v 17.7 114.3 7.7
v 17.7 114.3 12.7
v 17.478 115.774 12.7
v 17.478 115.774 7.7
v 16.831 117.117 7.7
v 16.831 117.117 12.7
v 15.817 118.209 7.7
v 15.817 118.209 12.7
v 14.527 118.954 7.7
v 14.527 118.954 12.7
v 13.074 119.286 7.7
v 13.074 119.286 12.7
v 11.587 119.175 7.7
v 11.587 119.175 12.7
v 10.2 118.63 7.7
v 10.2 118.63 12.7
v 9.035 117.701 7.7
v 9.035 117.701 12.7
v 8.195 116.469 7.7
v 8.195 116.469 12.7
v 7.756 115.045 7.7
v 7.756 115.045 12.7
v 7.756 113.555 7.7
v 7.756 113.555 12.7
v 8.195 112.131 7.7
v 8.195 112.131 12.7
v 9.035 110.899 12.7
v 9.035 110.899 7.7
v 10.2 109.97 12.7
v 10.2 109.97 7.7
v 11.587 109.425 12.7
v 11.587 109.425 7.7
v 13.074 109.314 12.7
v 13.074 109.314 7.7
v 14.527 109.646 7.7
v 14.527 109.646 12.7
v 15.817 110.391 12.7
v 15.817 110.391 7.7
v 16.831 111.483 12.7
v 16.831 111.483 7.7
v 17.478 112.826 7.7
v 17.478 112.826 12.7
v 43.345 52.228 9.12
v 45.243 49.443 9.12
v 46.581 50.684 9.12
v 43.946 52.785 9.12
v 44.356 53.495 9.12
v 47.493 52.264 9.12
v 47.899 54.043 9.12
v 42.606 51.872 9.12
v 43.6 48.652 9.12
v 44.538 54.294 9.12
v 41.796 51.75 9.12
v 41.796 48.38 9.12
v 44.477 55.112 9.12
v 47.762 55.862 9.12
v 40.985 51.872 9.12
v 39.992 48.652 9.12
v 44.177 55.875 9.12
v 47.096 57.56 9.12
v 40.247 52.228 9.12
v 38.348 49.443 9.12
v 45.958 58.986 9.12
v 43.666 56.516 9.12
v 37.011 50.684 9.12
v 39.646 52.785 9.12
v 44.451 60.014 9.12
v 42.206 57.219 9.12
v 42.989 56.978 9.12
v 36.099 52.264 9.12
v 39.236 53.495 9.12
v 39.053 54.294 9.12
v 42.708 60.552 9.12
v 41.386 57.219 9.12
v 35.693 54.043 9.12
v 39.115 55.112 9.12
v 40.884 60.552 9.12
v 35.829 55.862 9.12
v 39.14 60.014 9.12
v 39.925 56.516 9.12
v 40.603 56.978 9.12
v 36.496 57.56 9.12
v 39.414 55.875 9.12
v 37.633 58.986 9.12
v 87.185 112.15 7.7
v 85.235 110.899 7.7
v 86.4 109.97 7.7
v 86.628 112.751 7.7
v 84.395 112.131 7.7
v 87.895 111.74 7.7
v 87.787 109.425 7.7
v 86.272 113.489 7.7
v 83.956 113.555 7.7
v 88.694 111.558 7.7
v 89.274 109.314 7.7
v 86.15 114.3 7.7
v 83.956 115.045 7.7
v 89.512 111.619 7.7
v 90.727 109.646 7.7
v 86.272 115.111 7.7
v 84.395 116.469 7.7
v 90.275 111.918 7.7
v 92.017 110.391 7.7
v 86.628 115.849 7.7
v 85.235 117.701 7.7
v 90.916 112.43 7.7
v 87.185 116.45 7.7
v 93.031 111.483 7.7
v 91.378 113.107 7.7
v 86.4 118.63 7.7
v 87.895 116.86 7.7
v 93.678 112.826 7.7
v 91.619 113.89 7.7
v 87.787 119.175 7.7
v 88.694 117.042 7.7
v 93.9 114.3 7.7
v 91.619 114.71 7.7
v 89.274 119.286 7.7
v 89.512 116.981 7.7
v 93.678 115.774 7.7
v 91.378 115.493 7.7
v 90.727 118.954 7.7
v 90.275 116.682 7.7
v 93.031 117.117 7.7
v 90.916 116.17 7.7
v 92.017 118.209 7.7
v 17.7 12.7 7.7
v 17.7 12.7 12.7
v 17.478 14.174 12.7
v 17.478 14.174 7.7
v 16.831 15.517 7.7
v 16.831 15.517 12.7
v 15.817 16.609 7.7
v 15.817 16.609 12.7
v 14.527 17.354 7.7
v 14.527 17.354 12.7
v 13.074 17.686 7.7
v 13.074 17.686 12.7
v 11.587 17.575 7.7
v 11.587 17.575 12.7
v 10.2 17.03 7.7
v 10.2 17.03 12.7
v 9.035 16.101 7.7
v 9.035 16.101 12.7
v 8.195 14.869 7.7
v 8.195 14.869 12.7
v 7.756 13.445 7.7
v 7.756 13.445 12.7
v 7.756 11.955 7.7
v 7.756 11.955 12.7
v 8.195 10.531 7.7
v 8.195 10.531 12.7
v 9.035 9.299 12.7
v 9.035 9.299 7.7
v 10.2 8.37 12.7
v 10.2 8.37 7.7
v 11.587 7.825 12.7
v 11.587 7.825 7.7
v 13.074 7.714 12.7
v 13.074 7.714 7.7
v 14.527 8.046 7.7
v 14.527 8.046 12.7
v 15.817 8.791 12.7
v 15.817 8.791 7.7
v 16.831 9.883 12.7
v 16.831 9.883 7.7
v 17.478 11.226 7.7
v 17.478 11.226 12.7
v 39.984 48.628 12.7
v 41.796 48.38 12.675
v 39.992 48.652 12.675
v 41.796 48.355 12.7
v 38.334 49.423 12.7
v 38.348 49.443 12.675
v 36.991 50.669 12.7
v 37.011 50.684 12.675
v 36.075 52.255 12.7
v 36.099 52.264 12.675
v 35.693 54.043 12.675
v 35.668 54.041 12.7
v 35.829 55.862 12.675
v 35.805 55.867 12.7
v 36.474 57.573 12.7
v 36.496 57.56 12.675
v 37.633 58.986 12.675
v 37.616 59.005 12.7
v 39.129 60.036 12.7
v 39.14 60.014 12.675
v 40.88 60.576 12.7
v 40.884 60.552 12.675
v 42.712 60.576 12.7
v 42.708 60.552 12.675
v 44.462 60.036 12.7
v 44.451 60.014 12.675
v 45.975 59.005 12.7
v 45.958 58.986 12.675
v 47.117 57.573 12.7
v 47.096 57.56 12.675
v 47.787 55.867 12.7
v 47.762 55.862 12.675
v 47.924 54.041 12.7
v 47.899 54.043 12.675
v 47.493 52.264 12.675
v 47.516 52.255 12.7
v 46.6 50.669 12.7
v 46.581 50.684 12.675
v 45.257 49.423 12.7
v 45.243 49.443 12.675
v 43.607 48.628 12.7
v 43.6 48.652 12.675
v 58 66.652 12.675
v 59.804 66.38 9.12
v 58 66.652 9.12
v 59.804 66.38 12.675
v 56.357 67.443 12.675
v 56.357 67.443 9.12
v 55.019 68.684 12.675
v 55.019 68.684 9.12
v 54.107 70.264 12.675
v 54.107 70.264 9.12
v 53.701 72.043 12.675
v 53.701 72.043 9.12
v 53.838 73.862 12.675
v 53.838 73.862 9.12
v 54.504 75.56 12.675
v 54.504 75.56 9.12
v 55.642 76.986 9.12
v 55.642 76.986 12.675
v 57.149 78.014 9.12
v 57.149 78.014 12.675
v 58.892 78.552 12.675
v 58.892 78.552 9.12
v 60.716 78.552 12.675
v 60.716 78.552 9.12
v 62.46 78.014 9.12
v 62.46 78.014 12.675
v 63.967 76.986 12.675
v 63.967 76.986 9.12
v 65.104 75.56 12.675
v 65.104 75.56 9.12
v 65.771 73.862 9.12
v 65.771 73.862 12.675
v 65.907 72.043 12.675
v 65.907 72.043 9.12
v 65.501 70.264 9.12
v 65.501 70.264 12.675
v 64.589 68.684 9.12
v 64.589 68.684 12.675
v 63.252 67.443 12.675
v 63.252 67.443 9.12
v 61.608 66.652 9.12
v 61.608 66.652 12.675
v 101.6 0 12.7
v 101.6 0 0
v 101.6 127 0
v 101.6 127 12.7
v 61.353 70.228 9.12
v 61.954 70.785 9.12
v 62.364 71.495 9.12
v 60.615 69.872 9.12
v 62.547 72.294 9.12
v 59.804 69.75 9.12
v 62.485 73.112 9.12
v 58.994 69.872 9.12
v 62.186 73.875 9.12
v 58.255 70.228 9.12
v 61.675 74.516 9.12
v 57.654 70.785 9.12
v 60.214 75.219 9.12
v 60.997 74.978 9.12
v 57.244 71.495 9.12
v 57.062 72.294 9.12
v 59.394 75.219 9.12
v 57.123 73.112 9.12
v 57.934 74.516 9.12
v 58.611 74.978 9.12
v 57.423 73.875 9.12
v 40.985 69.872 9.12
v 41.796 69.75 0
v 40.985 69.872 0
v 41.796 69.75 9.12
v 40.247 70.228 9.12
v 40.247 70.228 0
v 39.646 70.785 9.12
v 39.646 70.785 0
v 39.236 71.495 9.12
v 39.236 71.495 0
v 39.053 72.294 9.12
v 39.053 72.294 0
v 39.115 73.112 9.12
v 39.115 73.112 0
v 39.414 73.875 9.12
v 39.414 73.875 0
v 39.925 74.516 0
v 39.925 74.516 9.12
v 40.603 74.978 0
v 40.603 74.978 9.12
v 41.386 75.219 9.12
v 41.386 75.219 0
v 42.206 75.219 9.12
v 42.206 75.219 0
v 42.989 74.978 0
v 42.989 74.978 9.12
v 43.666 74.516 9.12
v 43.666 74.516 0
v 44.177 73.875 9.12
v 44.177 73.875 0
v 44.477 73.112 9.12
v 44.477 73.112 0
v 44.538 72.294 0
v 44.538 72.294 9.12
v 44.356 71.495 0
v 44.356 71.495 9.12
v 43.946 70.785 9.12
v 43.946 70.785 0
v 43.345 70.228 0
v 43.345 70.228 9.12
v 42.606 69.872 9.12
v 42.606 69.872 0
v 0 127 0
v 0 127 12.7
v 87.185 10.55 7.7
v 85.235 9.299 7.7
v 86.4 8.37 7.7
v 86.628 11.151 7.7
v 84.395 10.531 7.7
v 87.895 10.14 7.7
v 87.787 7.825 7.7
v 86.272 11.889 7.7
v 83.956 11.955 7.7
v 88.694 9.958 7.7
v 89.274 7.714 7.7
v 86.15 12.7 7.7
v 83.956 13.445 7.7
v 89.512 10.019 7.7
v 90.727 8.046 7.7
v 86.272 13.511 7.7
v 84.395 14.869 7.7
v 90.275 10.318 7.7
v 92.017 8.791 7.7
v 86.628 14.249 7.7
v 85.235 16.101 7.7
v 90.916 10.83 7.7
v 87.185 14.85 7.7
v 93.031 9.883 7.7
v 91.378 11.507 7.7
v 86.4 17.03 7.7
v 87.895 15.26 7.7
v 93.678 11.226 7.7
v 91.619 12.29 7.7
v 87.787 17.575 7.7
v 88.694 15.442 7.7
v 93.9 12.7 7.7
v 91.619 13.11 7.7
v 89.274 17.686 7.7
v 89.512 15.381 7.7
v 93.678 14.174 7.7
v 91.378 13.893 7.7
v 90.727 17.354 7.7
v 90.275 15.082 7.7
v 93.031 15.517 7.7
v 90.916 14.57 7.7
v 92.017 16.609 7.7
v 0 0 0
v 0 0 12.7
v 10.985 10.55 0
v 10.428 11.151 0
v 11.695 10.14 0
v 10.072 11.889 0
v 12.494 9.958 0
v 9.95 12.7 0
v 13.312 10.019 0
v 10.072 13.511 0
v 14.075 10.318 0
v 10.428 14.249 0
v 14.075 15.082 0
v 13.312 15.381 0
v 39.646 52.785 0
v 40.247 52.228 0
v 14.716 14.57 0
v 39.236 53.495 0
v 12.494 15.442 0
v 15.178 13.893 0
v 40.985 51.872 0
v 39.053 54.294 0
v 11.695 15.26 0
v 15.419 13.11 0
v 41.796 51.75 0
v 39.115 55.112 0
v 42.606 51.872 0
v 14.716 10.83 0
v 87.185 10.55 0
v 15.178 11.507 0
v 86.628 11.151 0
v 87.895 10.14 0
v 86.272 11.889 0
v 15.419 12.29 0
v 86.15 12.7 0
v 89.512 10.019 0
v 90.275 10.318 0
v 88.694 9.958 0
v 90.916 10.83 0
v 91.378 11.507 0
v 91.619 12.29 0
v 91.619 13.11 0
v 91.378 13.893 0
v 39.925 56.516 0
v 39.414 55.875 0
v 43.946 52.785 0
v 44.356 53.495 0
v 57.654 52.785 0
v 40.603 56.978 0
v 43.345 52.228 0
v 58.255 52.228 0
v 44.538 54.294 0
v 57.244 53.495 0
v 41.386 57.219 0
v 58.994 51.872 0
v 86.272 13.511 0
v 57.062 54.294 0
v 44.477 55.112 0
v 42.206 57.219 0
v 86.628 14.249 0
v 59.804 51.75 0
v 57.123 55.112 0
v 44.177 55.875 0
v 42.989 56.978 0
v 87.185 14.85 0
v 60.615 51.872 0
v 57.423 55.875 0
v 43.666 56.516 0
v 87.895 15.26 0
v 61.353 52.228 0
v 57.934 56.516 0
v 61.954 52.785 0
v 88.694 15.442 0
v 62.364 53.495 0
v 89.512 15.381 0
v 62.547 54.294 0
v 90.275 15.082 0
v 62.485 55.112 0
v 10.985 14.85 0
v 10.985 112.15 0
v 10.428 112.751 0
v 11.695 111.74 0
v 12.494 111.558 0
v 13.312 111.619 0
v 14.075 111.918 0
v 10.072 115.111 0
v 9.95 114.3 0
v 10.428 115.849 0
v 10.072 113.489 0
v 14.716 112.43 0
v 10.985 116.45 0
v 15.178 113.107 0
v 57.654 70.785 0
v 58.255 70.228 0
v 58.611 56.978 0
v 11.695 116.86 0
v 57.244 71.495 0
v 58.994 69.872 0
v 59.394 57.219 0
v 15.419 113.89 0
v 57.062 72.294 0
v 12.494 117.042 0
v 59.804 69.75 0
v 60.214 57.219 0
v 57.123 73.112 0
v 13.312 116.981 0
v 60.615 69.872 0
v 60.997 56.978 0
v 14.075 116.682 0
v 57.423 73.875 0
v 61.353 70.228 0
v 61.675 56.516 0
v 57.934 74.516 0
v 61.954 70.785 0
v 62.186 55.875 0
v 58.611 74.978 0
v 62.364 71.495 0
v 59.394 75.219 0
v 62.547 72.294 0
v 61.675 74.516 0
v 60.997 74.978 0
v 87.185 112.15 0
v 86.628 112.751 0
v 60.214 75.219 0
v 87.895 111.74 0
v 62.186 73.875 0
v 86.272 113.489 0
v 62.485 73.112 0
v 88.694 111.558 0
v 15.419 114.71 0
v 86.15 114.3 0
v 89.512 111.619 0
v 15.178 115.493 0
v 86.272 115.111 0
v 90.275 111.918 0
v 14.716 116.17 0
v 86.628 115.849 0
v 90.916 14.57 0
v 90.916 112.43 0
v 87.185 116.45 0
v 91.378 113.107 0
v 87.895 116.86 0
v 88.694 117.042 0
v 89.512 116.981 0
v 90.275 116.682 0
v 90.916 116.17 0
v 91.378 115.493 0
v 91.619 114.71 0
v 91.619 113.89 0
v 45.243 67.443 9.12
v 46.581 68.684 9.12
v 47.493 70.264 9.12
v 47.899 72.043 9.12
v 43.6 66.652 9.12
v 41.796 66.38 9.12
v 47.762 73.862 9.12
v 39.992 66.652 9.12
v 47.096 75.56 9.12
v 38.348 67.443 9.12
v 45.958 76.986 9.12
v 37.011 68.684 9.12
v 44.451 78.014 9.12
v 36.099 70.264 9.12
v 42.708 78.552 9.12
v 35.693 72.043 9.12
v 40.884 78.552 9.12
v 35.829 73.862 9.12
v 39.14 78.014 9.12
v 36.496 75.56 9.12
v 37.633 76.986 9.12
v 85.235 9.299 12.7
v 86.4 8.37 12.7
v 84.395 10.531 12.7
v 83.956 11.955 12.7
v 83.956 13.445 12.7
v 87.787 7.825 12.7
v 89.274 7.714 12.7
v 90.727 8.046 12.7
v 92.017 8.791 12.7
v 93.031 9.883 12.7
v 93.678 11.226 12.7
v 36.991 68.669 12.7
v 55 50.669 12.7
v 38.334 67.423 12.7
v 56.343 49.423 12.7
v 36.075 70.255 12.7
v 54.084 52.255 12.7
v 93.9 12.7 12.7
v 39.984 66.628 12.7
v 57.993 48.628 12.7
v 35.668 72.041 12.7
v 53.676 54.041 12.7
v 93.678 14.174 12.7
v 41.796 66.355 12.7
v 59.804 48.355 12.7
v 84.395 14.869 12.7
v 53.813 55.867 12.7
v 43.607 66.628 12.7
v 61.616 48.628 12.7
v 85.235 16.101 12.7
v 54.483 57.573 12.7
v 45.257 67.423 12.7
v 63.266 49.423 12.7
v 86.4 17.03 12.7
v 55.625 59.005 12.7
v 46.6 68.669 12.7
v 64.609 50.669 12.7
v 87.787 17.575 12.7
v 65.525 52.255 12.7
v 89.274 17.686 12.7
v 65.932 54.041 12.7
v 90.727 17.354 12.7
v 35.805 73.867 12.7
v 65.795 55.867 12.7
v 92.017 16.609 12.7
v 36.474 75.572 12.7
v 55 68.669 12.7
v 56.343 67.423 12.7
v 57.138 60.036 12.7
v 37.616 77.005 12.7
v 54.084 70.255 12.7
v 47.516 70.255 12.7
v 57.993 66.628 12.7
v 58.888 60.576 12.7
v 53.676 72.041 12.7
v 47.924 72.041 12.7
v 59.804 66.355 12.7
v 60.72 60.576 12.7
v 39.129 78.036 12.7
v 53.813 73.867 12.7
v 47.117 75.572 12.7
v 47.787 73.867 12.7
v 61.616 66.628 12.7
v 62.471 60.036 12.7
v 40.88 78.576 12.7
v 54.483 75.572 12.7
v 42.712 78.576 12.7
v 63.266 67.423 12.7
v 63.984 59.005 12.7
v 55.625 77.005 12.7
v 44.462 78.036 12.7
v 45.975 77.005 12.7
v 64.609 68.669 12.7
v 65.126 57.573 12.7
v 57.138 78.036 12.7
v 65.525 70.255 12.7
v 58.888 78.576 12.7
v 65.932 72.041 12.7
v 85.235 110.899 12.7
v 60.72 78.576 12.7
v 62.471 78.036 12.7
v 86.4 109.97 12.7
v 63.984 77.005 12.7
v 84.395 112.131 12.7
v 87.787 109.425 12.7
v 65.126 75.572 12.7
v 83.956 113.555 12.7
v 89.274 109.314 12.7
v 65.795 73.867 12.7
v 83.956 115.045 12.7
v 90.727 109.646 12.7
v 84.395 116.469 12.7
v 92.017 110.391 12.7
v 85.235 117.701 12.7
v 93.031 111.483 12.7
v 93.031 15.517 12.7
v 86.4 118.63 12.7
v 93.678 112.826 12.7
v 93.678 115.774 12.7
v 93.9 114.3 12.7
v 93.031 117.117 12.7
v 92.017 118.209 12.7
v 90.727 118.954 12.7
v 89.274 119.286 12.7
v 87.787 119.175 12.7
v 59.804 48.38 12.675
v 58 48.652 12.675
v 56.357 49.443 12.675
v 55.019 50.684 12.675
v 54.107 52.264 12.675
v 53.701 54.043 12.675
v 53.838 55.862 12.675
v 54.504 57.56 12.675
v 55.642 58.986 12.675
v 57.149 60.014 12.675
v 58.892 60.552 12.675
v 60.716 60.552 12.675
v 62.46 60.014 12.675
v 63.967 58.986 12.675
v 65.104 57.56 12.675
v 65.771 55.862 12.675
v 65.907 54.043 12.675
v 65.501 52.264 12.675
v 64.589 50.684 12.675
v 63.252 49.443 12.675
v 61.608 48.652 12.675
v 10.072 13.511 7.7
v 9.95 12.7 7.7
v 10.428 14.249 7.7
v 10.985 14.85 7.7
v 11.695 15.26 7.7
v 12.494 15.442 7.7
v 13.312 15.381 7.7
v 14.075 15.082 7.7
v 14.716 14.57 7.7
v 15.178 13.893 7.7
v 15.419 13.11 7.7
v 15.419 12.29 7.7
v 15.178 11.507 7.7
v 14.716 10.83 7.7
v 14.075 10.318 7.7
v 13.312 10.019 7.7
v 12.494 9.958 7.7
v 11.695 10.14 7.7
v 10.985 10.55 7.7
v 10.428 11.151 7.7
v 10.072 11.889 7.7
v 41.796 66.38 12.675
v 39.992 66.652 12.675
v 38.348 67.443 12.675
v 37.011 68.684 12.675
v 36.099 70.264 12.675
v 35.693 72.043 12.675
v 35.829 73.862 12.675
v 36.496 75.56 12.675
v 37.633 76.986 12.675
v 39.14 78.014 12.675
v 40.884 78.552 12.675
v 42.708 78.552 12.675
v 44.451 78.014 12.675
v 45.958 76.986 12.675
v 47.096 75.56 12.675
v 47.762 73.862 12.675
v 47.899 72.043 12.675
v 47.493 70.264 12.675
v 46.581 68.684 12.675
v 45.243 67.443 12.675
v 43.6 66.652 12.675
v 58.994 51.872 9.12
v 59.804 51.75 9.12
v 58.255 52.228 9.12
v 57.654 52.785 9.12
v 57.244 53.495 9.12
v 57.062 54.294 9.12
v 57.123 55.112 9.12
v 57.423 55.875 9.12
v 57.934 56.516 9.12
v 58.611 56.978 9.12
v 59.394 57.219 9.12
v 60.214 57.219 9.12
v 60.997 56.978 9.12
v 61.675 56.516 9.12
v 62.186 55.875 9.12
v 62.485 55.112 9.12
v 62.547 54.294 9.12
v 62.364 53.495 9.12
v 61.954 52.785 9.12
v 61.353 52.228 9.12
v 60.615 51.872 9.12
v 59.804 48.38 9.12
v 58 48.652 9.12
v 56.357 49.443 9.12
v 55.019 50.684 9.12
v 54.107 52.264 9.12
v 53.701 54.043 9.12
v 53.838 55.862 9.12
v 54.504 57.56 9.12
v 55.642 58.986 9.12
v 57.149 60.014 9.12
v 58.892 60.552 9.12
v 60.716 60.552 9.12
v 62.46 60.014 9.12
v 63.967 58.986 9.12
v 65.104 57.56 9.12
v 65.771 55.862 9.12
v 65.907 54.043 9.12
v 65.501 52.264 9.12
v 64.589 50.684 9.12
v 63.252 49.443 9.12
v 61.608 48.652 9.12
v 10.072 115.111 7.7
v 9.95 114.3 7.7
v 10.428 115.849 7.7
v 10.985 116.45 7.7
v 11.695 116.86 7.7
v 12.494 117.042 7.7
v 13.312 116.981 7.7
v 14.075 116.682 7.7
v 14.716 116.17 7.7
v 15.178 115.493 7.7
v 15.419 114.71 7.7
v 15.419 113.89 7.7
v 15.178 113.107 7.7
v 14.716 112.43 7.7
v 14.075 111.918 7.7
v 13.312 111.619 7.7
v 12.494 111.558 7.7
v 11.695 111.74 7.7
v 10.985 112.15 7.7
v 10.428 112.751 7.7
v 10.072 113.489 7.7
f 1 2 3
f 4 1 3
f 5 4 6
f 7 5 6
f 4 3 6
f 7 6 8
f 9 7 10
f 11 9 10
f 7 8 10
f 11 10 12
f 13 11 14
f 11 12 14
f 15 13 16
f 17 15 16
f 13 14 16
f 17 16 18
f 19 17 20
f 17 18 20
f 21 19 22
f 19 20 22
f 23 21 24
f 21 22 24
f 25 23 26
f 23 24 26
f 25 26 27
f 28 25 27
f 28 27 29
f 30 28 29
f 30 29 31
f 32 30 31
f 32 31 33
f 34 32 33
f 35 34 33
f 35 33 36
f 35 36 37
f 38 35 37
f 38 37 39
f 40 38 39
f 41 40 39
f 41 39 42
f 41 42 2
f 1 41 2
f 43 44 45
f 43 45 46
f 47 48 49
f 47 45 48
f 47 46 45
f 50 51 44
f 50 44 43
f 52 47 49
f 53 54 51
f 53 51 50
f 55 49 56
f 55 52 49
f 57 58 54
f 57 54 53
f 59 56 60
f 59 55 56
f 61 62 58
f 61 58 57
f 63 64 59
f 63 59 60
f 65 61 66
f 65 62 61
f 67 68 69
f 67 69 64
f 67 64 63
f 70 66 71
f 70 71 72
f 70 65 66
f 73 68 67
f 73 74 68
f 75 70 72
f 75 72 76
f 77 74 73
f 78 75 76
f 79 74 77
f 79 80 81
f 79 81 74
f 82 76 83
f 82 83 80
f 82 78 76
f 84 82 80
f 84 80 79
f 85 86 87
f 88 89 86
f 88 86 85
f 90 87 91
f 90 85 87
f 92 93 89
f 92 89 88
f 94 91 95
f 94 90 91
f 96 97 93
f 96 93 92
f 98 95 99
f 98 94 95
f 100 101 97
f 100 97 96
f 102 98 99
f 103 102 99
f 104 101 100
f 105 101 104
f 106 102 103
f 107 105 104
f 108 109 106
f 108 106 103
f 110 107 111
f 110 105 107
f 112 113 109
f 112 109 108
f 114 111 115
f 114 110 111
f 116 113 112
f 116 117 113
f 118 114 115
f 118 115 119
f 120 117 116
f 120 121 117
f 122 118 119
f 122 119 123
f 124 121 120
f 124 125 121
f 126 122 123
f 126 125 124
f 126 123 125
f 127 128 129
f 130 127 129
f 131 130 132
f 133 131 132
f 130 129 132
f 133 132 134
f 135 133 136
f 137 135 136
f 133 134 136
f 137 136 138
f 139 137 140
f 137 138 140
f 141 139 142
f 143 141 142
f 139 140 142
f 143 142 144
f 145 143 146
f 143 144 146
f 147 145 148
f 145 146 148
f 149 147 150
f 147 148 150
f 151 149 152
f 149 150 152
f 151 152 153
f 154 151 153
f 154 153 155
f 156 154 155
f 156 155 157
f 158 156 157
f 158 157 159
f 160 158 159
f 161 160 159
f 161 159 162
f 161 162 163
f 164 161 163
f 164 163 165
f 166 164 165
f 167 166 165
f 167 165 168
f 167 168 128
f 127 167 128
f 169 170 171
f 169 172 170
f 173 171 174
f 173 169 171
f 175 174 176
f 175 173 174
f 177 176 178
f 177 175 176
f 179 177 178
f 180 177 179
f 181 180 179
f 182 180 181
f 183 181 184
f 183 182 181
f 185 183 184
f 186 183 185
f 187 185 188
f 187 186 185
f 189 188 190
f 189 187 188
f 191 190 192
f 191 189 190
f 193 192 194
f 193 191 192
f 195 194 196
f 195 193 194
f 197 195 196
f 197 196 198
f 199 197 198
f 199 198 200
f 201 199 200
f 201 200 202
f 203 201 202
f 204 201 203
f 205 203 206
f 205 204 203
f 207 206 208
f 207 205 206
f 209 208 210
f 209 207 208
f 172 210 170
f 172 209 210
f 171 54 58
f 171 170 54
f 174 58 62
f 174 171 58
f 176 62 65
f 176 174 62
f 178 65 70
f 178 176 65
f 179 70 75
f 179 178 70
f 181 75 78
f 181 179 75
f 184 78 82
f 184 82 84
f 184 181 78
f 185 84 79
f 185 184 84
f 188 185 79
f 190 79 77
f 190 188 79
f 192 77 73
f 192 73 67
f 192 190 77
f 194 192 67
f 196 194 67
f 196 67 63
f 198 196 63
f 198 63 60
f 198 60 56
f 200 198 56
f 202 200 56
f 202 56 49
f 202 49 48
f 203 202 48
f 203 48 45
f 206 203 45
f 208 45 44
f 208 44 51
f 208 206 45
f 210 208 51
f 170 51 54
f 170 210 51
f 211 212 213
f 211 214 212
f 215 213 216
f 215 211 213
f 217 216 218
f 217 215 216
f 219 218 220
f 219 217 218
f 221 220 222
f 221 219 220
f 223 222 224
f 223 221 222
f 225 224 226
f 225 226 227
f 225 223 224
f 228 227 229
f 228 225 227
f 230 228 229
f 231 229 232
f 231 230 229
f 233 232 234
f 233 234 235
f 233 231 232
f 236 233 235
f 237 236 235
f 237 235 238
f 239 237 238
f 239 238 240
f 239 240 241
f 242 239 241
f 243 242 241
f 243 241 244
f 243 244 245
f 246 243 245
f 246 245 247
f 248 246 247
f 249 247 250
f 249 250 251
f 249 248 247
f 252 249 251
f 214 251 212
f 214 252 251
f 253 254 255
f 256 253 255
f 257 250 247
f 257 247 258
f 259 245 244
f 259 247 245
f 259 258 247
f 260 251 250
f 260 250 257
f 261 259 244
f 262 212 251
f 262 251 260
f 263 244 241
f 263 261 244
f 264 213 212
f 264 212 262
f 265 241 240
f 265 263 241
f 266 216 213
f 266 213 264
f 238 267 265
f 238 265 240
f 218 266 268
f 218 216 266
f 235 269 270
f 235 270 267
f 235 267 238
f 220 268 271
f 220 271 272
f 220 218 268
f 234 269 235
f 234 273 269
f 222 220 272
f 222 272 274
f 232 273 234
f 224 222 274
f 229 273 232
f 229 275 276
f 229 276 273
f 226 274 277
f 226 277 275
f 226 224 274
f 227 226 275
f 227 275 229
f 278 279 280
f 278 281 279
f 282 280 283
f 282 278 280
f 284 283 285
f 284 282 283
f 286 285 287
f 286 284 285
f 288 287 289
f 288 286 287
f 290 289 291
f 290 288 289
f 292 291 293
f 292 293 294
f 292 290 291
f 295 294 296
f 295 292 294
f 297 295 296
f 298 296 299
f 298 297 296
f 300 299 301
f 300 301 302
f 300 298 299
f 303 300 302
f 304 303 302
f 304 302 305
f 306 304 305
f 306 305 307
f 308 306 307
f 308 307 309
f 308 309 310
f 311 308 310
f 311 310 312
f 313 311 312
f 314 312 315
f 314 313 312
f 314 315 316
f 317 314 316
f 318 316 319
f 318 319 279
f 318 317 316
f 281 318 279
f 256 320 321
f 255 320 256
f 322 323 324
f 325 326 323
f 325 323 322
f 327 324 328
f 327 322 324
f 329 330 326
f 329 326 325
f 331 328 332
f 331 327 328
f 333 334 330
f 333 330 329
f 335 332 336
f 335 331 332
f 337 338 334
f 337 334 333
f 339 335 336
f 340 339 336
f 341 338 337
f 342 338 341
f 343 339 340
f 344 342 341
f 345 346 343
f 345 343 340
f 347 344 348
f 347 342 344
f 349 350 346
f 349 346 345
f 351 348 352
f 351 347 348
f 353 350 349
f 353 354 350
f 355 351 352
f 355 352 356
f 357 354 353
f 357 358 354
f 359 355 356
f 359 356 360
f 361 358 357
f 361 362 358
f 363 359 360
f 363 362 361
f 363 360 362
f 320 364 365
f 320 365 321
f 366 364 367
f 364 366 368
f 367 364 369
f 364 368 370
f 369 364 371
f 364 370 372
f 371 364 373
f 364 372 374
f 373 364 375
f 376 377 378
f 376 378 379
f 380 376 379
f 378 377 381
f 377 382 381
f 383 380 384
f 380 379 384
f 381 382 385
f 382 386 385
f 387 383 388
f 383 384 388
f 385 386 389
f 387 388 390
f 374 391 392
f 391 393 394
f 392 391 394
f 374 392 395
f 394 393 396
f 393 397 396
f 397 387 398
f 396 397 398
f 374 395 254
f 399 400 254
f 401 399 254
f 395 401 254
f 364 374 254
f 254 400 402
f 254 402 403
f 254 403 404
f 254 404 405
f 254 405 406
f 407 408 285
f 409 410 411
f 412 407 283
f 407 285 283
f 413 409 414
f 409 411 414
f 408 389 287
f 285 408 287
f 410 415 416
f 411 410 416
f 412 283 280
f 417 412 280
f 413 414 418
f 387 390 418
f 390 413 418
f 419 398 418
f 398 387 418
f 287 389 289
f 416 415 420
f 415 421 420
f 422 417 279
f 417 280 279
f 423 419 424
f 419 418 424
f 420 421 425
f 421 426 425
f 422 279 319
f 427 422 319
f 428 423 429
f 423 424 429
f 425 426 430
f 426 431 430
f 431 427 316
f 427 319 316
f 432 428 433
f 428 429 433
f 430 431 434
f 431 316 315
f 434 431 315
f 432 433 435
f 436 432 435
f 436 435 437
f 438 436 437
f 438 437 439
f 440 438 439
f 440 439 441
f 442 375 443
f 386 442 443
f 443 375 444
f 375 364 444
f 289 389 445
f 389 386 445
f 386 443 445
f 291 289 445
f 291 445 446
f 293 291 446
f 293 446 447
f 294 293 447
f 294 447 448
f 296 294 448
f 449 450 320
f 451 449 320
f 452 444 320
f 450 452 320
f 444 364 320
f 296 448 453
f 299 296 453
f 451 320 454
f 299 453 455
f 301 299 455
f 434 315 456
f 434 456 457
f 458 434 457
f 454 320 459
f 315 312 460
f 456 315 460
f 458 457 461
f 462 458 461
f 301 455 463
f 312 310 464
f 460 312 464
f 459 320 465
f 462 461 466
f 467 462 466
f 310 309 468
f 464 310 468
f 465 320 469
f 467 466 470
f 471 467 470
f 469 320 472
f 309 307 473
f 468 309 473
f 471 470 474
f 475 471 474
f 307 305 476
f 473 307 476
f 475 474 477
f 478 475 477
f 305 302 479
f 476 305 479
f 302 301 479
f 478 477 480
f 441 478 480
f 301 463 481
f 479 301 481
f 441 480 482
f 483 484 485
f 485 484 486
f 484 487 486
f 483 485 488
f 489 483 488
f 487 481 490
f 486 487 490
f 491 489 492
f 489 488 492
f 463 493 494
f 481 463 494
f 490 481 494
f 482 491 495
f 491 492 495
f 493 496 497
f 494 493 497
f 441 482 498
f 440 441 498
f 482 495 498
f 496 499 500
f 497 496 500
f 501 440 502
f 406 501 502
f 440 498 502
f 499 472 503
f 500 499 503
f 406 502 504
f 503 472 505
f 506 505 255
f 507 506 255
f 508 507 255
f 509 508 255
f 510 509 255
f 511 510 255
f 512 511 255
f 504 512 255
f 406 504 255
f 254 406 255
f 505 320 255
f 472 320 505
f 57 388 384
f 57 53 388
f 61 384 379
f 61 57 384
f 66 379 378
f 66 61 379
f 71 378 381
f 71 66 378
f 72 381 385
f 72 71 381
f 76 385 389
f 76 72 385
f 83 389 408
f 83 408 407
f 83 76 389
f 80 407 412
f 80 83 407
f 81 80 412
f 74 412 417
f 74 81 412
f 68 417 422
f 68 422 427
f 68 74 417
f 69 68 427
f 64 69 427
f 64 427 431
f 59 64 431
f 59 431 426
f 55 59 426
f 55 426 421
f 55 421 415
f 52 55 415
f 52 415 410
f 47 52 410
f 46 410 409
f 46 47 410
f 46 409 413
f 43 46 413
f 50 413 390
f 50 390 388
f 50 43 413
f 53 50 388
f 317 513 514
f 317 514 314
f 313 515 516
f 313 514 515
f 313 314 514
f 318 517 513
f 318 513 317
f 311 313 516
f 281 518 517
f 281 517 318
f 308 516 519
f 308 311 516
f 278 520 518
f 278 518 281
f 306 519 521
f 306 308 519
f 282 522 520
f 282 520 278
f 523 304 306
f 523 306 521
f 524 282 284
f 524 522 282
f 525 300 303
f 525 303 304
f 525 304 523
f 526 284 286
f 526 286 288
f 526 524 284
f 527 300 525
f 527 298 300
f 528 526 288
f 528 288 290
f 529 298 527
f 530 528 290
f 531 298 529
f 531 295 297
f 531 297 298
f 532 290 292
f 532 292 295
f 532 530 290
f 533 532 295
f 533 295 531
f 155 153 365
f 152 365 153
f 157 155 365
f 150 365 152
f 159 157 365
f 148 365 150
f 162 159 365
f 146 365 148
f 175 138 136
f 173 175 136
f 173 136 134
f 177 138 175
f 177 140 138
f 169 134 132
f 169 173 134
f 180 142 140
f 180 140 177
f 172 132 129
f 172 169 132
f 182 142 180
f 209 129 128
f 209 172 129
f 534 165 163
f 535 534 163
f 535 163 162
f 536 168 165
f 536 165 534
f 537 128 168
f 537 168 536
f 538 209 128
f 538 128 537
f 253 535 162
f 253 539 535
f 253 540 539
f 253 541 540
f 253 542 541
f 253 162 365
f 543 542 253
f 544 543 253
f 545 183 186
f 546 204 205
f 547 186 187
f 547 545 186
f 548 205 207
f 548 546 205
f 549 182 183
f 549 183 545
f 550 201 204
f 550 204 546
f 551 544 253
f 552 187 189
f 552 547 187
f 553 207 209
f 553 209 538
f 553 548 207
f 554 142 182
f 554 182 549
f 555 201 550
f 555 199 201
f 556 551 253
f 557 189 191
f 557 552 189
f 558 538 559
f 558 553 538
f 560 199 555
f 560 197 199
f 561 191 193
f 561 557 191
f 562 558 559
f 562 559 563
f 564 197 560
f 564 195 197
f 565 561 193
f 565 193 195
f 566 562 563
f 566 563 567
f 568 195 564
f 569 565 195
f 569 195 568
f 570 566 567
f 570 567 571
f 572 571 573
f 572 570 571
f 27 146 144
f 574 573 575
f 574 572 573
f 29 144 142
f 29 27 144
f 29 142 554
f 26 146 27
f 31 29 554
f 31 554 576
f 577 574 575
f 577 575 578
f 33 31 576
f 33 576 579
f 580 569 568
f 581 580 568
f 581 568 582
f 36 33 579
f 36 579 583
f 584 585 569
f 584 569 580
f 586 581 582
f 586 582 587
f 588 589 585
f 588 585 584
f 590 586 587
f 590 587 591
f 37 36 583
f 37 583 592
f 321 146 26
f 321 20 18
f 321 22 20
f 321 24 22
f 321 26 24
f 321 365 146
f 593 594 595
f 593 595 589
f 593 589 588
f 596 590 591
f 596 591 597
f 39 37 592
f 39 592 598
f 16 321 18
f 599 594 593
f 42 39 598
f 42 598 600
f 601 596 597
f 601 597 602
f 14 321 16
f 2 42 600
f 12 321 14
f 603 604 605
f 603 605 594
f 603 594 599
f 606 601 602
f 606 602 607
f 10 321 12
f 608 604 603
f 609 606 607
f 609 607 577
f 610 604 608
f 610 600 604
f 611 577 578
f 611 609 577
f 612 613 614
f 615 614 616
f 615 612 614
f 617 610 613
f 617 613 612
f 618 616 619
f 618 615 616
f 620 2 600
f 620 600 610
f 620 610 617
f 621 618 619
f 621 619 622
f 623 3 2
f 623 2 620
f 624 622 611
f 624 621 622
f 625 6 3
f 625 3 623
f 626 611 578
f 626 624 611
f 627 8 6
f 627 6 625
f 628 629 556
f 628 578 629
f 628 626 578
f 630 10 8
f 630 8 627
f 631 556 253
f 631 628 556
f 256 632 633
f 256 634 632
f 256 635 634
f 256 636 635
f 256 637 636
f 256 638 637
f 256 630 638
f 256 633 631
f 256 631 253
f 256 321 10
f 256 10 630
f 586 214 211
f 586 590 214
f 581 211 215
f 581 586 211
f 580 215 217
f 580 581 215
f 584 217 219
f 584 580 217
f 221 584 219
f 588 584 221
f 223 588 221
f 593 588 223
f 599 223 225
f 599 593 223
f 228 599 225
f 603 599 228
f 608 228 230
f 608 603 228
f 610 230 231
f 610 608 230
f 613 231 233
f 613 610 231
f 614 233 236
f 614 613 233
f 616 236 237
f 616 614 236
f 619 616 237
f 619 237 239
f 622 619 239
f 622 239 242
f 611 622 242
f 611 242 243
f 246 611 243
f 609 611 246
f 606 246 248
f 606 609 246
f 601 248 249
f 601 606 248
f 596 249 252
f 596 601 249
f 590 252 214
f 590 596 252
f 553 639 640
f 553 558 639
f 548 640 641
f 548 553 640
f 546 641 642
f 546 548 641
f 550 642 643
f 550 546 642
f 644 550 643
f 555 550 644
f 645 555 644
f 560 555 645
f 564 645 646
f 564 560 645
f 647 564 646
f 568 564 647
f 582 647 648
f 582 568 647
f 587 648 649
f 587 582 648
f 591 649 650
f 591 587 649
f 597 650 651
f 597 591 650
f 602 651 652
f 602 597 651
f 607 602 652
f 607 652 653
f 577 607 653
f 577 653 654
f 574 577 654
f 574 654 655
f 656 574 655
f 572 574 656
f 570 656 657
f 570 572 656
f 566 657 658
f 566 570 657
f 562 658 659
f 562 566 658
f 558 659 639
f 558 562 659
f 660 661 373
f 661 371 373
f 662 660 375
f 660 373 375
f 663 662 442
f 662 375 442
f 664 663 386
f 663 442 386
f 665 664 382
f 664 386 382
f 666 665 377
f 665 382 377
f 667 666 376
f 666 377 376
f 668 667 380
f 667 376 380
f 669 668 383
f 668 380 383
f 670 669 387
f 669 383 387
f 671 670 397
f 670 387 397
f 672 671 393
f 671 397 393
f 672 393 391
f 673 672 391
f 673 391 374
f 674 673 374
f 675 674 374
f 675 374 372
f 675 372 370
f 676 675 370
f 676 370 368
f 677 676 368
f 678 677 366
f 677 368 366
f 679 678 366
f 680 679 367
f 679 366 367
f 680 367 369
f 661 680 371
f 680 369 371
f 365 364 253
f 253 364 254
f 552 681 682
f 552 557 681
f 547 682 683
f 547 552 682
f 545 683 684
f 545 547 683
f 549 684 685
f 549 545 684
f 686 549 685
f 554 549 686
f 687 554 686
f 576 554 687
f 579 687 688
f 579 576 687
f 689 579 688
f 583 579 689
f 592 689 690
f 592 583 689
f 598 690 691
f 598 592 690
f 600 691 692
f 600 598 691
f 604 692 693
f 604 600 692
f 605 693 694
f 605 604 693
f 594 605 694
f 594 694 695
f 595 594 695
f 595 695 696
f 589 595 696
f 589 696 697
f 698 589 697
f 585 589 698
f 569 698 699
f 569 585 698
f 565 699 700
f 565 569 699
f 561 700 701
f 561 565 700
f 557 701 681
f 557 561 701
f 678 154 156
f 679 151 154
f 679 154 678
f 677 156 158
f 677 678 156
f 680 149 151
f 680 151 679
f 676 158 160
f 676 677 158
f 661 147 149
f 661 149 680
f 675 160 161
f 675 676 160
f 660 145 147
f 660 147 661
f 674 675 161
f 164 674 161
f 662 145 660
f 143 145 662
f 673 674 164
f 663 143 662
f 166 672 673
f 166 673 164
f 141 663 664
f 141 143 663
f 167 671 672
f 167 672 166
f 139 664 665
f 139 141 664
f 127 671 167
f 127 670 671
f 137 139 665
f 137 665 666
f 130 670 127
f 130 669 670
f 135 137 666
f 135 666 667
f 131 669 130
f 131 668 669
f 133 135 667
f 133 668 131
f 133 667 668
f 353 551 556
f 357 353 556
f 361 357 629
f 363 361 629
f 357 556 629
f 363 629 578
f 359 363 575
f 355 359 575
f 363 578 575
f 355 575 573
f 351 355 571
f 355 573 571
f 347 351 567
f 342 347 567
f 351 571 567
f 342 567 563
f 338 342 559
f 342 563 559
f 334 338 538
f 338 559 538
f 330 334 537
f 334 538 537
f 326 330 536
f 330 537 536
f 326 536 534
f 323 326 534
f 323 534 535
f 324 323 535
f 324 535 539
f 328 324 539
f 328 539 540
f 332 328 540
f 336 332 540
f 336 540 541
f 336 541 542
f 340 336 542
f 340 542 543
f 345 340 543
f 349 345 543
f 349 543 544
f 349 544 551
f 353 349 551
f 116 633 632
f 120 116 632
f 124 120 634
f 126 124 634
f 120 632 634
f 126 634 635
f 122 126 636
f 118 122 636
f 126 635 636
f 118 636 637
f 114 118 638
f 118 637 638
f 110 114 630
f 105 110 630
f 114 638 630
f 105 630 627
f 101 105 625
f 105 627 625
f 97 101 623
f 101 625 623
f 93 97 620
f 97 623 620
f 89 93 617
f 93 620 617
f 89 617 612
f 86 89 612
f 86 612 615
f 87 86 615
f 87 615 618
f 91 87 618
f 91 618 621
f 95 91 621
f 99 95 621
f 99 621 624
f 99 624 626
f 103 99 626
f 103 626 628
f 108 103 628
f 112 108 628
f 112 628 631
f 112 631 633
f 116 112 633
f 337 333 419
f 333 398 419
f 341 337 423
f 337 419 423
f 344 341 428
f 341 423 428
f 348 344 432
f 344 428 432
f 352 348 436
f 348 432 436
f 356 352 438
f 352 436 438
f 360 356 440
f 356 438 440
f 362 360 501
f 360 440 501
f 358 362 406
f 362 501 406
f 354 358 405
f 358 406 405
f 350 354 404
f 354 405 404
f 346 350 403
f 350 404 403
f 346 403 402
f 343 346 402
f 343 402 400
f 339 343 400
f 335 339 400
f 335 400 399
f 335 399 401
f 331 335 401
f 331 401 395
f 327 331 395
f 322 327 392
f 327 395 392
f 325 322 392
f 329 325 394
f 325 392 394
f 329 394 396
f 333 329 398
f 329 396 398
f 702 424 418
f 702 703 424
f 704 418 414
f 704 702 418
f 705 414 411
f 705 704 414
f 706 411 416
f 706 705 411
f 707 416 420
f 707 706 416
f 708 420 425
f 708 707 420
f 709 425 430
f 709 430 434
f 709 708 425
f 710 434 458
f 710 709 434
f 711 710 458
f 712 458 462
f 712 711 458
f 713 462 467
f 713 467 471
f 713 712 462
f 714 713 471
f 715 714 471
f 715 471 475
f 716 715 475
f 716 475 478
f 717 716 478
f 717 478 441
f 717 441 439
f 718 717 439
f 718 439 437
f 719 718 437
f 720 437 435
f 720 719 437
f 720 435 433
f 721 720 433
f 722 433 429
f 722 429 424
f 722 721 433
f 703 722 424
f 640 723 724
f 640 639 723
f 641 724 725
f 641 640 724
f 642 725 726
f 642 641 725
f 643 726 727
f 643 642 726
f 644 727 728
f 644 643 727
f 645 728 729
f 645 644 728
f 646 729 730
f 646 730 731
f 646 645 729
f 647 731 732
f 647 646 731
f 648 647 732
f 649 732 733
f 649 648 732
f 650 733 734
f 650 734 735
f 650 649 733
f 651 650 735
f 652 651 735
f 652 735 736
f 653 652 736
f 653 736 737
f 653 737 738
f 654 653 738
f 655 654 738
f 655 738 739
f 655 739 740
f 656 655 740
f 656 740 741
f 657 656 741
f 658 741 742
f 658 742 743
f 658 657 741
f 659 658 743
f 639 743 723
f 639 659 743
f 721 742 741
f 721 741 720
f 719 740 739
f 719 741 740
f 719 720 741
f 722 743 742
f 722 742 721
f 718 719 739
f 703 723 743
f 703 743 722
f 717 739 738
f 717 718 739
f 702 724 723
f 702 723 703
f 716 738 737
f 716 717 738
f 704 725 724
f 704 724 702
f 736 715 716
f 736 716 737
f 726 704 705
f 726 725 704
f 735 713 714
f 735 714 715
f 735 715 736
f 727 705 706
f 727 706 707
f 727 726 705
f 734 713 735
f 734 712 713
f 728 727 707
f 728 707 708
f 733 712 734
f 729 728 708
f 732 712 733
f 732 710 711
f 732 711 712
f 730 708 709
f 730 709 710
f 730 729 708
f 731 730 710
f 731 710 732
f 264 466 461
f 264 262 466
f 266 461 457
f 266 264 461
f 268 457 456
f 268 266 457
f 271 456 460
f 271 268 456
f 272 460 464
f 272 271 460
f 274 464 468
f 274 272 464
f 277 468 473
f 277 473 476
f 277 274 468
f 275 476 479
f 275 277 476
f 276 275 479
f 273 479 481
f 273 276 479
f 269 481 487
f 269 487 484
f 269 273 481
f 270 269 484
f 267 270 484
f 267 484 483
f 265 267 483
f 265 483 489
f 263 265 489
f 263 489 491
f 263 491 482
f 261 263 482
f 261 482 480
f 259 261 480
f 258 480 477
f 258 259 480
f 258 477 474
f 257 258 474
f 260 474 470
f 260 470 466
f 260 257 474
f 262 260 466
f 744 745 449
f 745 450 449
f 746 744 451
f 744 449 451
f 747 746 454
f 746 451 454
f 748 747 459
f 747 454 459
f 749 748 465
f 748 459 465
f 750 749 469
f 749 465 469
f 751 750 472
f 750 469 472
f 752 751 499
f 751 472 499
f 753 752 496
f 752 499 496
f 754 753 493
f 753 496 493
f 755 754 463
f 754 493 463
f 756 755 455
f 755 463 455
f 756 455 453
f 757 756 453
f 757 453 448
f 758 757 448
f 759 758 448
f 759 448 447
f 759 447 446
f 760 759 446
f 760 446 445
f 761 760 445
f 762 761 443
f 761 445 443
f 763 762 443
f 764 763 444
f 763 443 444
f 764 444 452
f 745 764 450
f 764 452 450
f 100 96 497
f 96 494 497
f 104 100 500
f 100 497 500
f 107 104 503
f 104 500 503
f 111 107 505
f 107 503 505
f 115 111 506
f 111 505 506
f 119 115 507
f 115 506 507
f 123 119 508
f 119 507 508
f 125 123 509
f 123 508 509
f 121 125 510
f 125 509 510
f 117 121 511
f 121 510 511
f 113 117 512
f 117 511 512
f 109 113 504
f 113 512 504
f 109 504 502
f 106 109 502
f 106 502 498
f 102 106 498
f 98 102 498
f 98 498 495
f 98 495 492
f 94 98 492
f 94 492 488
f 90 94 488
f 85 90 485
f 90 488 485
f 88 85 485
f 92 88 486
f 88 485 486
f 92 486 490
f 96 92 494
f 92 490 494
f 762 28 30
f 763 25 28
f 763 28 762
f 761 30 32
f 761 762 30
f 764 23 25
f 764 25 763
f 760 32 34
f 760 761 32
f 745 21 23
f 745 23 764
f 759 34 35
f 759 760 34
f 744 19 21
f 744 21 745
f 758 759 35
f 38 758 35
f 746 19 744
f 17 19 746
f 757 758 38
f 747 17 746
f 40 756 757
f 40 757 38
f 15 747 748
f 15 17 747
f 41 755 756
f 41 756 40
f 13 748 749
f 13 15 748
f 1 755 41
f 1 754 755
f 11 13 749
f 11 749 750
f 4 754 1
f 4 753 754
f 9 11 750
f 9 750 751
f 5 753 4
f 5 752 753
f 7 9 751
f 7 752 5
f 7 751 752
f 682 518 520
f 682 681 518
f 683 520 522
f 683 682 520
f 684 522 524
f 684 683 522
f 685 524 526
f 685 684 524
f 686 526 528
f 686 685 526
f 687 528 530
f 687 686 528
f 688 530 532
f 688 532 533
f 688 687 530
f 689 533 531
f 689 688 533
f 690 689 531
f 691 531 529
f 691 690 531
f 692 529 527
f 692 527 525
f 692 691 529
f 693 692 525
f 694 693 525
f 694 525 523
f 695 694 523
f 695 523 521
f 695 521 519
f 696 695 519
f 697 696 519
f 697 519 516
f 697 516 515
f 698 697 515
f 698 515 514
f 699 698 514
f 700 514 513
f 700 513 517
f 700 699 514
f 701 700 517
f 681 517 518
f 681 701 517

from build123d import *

# Parameters (mm, degrees)
SKETCH1_W                              = 101.6
SKETCH1_H                              = 127
BOSS_EXTRUDE1_DEPTH                    = 12.7
CBORE_FOR_M5_HEX_HEAD_BOLT1_AT_2_COUNT = 2
CBORE_FOR_M5_HEX_HEAD_BOLT1_AT_2_PITCH = 18.0086
CBORE_FOR_M5_HEX_HEAD_BOLT1_AT_3_COUNT = 2
CBORE_FOR_M5_HEX_HEAD_BOLT1_AT_3_PITCH = 25.461925967
CBORE_FOR_M5_HEX_HEAD_BOLT1_AT_4_COUNT = 2
CBORE_FOR_M5_HEX_HEAD_BOLT1_AT_4_PITCH = 18
CBORE_FOR_M5_SHCS1_D                   = 5.5
CBORE_FOR_M5_SHCS1_CBORE_D             = 10
CBORE_FOR_M5_SHCS1_CBORE_DEPTH         = 5


with BuildPart() as part:
    # Sketch1 → Boss-Extrude1 (new body)
    with BuildSketch(Plane.XY):
        with Locations((50.8, 63.5)):
            Rectangle(SKETCH1_W, SKETCH1_H)
    extrude(amount=BOSS_EXTRUDE1_DEPTH)

    # Sketch8 → CBORE for M5 Hex Head Bolt1 (revolve, cut)
    with BuildSketch(Plane(origin=(41.7957, 72.5, 12.7), x_dir=(0, -1, 0), z_dir=(1, 0, 0))):
        Polygon((0, 0), (0, 12.7), (2.75, 12.7), (2.75, 3.58), (6.12, 3.58), (6.12, 0.025), (6.145, 0), align=None)
    cbore_for_m5_hex_head_bolt1 = revolve(axis=Axis((41.7957, 72.5, 19.05), (0, 0, -1)), mode=Mode.SUBTRACT)

    # CBORE for M5 Hex Head Bolt1 at 2: CBORE for M5 Hex Head Bolt1 ×2
    with Locations(*[(i * CBORE_FOR_M5_HEX_HEAD_BOLT1_AT_2_PITCH, 0, 0) for i in range(1, CBORE_FOR_M5_HEX_HEAD_BOLT1_AT_2_COUNT)]):
        add(cbore_for_m5_hex_head_bolt1, mode=Mode.SUBTRACT)

    # CBORE for M5 Hex Head Bolt1 at 3: CBORE for M5 Hex Head Bolt1 ×2
    with Locations(*[Vector(0.7072756406246394, -0.7069378814146302, 0) * (i * CBORE_FOR_M5_HEX_HEAD_BOLT1_AT_3_PITCH) for i in range(1, CBORE_FOR_M5_HEX_HEAD_BOLT1_AT_3_COUNT)]):
        add(cbore_for_m5_hex_head_bolt1, mode=Mode.SUBTRACT)

    # CBORE for M5 Hex Head Bolt1 at 4: CBORE for M5 Hex Head Bolt1 ×2
    with Locations(*[(0, -i * CBORE_FOR_M5_HEX_HEAD_BOLT1_AT_4_PITCH, 0) for i in range(1, CBORE_FOR_M5_HEX_HEAD_BOLT1_AT_4_COUNT)]):
        add(cbore_for_m5_hex_head_bolt1, mode=Mode.SUBTRACT)

    # CBORE for M5 SHCS1 (through all)
    with Locations(Plane.XY.offset(12.7)):
        with Locations((12.7, 114.3), (88.9, 114.3), (88.9, 12.7), (12.7, 12.7)):
            CounterBoreHole(CBORE_FOR_M5_SHCS1_D / 2, CBORE_FOR_M5_SHCS1_CBORE_D / 2, CBORE_FOR_M5_SHCS1_CBORE_DEPTH)


solid = part.part
